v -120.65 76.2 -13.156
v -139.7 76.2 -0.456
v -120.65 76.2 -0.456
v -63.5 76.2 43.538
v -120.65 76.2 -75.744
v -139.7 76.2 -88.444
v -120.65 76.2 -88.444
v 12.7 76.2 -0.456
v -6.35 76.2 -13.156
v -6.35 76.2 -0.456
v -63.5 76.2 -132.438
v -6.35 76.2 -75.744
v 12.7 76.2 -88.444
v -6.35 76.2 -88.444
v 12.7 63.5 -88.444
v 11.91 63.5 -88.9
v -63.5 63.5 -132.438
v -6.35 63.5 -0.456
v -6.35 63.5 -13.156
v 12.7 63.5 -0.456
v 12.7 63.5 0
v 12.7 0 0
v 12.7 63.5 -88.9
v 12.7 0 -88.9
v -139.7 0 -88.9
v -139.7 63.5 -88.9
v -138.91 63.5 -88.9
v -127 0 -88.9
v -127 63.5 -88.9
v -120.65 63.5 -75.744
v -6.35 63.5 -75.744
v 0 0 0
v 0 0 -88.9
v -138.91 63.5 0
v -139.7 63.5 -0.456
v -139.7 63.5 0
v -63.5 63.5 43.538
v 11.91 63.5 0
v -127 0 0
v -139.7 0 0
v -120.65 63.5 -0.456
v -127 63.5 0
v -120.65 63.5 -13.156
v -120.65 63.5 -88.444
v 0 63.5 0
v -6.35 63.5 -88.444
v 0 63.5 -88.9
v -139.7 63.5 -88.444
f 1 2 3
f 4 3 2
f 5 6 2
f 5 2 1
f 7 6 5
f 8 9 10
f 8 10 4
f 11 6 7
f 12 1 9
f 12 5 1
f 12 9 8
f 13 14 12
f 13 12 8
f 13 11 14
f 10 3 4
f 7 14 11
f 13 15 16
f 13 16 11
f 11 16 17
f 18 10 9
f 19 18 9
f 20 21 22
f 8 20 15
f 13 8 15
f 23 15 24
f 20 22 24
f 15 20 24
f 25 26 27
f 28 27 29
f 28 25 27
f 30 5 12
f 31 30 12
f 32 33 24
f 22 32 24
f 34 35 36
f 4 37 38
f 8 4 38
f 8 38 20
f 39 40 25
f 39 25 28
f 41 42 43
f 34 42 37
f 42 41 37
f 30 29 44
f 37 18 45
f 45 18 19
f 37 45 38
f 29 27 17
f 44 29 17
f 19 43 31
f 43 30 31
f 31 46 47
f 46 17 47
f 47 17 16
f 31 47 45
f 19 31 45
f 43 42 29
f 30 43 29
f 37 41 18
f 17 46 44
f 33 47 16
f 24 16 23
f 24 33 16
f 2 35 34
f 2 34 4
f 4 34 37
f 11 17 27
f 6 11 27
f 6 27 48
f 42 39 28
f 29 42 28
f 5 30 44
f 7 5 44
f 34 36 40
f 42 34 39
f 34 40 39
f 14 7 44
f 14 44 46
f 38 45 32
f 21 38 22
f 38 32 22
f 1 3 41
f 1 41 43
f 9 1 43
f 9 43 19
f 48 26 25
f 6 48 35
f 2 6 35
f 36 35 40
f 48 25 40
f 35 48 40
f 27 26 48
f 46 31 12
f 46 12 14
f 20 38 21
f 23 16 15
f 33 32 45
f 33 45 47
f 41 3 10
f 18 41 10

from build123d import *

# Parameters (mm, degrees)
SKETCH1_W             = 12.7
SKETCH1_H             = 88.9
BOSS_EXTRUDE1_DEPTH   = 63.5
BOSS_EXTRUDE1_2_DEPTH = 63.5
BOSS_EXTRUDE2_DEPTH   = 12.7
SKETCH3_W             = 114.3
SKETCH3_H             = 12.7
CUT_EXTRUDE1_DEPTH    = 208.03236895


with BuildPart() as part:
    # Sketch1 → Boss-Extrude1 (new body)
    with BuildSketch(Plane(origin=(0, 0, 0), x_dir=(1, 0, 0), z_dir=(0, 1, 0))):
        with Locations((6.35, 44.45)):
            Rectangle(SKETCH1_W, SKETCH1_H)
    extrude(amount=BOSS_EXTRUDE1_DEPTH)



with BuildPart() as body_2:
    # Sketch1 → Boss-Extrude1 2 (new body)
    with BuildSketch(Plane(origin=(0, 0, 0), x_dir=(1, 0, 0), z_dir=(0, 1, 0))):
        with Locations((-133.35, 44.45)):
            Rectangle(SKETCH1_W, SKETCH1_H)
    extrude(amount=BOSS_EXTRUDE1_2_DEPTH)


with BuildPart() as part_1:
    add(part.part)

    add(body_2.part)  # Boss-Extrude2 merges body 2
    # Sketch2 → Boss-Extrude2 (add)
    with BuildSketch(Plane(origin=(0, 63.5, 0), x_dir=(1, 0, 0), z_dir=(0, 1, 0))):
        Polygon((-63.5, -43.538181024), (12.7, 0.455909488), (12.7, 88.444090512), (-63.5, 132.438181024), (-139.7, 88.444090512), (-139.7, 0.455909488), align=None)
    extrude(amount=BOSS_EXTRUDE2_DEPTH)

    # Sketch3 → Cut-Extrude1 (cut, through all)
    with BuildSketch(Plane(origin=(0, 76.2, 0), x_dir=(1, 0, 0), z_dir=(0, 1, 0))):
        with Locations((-63.5, 6.805909488)):
            Rectangle(SKETCH3_W, SKETCH3_H)
        with Locations((-63.5, 82.094090512)):
            Rectangle(SKETCH3_W, SKETCH3_H)
    extrude(amount=-CUT_EXTRUDE1_DEPTH, mode=Mode.SUBTRACT)


solid = part_1.part
